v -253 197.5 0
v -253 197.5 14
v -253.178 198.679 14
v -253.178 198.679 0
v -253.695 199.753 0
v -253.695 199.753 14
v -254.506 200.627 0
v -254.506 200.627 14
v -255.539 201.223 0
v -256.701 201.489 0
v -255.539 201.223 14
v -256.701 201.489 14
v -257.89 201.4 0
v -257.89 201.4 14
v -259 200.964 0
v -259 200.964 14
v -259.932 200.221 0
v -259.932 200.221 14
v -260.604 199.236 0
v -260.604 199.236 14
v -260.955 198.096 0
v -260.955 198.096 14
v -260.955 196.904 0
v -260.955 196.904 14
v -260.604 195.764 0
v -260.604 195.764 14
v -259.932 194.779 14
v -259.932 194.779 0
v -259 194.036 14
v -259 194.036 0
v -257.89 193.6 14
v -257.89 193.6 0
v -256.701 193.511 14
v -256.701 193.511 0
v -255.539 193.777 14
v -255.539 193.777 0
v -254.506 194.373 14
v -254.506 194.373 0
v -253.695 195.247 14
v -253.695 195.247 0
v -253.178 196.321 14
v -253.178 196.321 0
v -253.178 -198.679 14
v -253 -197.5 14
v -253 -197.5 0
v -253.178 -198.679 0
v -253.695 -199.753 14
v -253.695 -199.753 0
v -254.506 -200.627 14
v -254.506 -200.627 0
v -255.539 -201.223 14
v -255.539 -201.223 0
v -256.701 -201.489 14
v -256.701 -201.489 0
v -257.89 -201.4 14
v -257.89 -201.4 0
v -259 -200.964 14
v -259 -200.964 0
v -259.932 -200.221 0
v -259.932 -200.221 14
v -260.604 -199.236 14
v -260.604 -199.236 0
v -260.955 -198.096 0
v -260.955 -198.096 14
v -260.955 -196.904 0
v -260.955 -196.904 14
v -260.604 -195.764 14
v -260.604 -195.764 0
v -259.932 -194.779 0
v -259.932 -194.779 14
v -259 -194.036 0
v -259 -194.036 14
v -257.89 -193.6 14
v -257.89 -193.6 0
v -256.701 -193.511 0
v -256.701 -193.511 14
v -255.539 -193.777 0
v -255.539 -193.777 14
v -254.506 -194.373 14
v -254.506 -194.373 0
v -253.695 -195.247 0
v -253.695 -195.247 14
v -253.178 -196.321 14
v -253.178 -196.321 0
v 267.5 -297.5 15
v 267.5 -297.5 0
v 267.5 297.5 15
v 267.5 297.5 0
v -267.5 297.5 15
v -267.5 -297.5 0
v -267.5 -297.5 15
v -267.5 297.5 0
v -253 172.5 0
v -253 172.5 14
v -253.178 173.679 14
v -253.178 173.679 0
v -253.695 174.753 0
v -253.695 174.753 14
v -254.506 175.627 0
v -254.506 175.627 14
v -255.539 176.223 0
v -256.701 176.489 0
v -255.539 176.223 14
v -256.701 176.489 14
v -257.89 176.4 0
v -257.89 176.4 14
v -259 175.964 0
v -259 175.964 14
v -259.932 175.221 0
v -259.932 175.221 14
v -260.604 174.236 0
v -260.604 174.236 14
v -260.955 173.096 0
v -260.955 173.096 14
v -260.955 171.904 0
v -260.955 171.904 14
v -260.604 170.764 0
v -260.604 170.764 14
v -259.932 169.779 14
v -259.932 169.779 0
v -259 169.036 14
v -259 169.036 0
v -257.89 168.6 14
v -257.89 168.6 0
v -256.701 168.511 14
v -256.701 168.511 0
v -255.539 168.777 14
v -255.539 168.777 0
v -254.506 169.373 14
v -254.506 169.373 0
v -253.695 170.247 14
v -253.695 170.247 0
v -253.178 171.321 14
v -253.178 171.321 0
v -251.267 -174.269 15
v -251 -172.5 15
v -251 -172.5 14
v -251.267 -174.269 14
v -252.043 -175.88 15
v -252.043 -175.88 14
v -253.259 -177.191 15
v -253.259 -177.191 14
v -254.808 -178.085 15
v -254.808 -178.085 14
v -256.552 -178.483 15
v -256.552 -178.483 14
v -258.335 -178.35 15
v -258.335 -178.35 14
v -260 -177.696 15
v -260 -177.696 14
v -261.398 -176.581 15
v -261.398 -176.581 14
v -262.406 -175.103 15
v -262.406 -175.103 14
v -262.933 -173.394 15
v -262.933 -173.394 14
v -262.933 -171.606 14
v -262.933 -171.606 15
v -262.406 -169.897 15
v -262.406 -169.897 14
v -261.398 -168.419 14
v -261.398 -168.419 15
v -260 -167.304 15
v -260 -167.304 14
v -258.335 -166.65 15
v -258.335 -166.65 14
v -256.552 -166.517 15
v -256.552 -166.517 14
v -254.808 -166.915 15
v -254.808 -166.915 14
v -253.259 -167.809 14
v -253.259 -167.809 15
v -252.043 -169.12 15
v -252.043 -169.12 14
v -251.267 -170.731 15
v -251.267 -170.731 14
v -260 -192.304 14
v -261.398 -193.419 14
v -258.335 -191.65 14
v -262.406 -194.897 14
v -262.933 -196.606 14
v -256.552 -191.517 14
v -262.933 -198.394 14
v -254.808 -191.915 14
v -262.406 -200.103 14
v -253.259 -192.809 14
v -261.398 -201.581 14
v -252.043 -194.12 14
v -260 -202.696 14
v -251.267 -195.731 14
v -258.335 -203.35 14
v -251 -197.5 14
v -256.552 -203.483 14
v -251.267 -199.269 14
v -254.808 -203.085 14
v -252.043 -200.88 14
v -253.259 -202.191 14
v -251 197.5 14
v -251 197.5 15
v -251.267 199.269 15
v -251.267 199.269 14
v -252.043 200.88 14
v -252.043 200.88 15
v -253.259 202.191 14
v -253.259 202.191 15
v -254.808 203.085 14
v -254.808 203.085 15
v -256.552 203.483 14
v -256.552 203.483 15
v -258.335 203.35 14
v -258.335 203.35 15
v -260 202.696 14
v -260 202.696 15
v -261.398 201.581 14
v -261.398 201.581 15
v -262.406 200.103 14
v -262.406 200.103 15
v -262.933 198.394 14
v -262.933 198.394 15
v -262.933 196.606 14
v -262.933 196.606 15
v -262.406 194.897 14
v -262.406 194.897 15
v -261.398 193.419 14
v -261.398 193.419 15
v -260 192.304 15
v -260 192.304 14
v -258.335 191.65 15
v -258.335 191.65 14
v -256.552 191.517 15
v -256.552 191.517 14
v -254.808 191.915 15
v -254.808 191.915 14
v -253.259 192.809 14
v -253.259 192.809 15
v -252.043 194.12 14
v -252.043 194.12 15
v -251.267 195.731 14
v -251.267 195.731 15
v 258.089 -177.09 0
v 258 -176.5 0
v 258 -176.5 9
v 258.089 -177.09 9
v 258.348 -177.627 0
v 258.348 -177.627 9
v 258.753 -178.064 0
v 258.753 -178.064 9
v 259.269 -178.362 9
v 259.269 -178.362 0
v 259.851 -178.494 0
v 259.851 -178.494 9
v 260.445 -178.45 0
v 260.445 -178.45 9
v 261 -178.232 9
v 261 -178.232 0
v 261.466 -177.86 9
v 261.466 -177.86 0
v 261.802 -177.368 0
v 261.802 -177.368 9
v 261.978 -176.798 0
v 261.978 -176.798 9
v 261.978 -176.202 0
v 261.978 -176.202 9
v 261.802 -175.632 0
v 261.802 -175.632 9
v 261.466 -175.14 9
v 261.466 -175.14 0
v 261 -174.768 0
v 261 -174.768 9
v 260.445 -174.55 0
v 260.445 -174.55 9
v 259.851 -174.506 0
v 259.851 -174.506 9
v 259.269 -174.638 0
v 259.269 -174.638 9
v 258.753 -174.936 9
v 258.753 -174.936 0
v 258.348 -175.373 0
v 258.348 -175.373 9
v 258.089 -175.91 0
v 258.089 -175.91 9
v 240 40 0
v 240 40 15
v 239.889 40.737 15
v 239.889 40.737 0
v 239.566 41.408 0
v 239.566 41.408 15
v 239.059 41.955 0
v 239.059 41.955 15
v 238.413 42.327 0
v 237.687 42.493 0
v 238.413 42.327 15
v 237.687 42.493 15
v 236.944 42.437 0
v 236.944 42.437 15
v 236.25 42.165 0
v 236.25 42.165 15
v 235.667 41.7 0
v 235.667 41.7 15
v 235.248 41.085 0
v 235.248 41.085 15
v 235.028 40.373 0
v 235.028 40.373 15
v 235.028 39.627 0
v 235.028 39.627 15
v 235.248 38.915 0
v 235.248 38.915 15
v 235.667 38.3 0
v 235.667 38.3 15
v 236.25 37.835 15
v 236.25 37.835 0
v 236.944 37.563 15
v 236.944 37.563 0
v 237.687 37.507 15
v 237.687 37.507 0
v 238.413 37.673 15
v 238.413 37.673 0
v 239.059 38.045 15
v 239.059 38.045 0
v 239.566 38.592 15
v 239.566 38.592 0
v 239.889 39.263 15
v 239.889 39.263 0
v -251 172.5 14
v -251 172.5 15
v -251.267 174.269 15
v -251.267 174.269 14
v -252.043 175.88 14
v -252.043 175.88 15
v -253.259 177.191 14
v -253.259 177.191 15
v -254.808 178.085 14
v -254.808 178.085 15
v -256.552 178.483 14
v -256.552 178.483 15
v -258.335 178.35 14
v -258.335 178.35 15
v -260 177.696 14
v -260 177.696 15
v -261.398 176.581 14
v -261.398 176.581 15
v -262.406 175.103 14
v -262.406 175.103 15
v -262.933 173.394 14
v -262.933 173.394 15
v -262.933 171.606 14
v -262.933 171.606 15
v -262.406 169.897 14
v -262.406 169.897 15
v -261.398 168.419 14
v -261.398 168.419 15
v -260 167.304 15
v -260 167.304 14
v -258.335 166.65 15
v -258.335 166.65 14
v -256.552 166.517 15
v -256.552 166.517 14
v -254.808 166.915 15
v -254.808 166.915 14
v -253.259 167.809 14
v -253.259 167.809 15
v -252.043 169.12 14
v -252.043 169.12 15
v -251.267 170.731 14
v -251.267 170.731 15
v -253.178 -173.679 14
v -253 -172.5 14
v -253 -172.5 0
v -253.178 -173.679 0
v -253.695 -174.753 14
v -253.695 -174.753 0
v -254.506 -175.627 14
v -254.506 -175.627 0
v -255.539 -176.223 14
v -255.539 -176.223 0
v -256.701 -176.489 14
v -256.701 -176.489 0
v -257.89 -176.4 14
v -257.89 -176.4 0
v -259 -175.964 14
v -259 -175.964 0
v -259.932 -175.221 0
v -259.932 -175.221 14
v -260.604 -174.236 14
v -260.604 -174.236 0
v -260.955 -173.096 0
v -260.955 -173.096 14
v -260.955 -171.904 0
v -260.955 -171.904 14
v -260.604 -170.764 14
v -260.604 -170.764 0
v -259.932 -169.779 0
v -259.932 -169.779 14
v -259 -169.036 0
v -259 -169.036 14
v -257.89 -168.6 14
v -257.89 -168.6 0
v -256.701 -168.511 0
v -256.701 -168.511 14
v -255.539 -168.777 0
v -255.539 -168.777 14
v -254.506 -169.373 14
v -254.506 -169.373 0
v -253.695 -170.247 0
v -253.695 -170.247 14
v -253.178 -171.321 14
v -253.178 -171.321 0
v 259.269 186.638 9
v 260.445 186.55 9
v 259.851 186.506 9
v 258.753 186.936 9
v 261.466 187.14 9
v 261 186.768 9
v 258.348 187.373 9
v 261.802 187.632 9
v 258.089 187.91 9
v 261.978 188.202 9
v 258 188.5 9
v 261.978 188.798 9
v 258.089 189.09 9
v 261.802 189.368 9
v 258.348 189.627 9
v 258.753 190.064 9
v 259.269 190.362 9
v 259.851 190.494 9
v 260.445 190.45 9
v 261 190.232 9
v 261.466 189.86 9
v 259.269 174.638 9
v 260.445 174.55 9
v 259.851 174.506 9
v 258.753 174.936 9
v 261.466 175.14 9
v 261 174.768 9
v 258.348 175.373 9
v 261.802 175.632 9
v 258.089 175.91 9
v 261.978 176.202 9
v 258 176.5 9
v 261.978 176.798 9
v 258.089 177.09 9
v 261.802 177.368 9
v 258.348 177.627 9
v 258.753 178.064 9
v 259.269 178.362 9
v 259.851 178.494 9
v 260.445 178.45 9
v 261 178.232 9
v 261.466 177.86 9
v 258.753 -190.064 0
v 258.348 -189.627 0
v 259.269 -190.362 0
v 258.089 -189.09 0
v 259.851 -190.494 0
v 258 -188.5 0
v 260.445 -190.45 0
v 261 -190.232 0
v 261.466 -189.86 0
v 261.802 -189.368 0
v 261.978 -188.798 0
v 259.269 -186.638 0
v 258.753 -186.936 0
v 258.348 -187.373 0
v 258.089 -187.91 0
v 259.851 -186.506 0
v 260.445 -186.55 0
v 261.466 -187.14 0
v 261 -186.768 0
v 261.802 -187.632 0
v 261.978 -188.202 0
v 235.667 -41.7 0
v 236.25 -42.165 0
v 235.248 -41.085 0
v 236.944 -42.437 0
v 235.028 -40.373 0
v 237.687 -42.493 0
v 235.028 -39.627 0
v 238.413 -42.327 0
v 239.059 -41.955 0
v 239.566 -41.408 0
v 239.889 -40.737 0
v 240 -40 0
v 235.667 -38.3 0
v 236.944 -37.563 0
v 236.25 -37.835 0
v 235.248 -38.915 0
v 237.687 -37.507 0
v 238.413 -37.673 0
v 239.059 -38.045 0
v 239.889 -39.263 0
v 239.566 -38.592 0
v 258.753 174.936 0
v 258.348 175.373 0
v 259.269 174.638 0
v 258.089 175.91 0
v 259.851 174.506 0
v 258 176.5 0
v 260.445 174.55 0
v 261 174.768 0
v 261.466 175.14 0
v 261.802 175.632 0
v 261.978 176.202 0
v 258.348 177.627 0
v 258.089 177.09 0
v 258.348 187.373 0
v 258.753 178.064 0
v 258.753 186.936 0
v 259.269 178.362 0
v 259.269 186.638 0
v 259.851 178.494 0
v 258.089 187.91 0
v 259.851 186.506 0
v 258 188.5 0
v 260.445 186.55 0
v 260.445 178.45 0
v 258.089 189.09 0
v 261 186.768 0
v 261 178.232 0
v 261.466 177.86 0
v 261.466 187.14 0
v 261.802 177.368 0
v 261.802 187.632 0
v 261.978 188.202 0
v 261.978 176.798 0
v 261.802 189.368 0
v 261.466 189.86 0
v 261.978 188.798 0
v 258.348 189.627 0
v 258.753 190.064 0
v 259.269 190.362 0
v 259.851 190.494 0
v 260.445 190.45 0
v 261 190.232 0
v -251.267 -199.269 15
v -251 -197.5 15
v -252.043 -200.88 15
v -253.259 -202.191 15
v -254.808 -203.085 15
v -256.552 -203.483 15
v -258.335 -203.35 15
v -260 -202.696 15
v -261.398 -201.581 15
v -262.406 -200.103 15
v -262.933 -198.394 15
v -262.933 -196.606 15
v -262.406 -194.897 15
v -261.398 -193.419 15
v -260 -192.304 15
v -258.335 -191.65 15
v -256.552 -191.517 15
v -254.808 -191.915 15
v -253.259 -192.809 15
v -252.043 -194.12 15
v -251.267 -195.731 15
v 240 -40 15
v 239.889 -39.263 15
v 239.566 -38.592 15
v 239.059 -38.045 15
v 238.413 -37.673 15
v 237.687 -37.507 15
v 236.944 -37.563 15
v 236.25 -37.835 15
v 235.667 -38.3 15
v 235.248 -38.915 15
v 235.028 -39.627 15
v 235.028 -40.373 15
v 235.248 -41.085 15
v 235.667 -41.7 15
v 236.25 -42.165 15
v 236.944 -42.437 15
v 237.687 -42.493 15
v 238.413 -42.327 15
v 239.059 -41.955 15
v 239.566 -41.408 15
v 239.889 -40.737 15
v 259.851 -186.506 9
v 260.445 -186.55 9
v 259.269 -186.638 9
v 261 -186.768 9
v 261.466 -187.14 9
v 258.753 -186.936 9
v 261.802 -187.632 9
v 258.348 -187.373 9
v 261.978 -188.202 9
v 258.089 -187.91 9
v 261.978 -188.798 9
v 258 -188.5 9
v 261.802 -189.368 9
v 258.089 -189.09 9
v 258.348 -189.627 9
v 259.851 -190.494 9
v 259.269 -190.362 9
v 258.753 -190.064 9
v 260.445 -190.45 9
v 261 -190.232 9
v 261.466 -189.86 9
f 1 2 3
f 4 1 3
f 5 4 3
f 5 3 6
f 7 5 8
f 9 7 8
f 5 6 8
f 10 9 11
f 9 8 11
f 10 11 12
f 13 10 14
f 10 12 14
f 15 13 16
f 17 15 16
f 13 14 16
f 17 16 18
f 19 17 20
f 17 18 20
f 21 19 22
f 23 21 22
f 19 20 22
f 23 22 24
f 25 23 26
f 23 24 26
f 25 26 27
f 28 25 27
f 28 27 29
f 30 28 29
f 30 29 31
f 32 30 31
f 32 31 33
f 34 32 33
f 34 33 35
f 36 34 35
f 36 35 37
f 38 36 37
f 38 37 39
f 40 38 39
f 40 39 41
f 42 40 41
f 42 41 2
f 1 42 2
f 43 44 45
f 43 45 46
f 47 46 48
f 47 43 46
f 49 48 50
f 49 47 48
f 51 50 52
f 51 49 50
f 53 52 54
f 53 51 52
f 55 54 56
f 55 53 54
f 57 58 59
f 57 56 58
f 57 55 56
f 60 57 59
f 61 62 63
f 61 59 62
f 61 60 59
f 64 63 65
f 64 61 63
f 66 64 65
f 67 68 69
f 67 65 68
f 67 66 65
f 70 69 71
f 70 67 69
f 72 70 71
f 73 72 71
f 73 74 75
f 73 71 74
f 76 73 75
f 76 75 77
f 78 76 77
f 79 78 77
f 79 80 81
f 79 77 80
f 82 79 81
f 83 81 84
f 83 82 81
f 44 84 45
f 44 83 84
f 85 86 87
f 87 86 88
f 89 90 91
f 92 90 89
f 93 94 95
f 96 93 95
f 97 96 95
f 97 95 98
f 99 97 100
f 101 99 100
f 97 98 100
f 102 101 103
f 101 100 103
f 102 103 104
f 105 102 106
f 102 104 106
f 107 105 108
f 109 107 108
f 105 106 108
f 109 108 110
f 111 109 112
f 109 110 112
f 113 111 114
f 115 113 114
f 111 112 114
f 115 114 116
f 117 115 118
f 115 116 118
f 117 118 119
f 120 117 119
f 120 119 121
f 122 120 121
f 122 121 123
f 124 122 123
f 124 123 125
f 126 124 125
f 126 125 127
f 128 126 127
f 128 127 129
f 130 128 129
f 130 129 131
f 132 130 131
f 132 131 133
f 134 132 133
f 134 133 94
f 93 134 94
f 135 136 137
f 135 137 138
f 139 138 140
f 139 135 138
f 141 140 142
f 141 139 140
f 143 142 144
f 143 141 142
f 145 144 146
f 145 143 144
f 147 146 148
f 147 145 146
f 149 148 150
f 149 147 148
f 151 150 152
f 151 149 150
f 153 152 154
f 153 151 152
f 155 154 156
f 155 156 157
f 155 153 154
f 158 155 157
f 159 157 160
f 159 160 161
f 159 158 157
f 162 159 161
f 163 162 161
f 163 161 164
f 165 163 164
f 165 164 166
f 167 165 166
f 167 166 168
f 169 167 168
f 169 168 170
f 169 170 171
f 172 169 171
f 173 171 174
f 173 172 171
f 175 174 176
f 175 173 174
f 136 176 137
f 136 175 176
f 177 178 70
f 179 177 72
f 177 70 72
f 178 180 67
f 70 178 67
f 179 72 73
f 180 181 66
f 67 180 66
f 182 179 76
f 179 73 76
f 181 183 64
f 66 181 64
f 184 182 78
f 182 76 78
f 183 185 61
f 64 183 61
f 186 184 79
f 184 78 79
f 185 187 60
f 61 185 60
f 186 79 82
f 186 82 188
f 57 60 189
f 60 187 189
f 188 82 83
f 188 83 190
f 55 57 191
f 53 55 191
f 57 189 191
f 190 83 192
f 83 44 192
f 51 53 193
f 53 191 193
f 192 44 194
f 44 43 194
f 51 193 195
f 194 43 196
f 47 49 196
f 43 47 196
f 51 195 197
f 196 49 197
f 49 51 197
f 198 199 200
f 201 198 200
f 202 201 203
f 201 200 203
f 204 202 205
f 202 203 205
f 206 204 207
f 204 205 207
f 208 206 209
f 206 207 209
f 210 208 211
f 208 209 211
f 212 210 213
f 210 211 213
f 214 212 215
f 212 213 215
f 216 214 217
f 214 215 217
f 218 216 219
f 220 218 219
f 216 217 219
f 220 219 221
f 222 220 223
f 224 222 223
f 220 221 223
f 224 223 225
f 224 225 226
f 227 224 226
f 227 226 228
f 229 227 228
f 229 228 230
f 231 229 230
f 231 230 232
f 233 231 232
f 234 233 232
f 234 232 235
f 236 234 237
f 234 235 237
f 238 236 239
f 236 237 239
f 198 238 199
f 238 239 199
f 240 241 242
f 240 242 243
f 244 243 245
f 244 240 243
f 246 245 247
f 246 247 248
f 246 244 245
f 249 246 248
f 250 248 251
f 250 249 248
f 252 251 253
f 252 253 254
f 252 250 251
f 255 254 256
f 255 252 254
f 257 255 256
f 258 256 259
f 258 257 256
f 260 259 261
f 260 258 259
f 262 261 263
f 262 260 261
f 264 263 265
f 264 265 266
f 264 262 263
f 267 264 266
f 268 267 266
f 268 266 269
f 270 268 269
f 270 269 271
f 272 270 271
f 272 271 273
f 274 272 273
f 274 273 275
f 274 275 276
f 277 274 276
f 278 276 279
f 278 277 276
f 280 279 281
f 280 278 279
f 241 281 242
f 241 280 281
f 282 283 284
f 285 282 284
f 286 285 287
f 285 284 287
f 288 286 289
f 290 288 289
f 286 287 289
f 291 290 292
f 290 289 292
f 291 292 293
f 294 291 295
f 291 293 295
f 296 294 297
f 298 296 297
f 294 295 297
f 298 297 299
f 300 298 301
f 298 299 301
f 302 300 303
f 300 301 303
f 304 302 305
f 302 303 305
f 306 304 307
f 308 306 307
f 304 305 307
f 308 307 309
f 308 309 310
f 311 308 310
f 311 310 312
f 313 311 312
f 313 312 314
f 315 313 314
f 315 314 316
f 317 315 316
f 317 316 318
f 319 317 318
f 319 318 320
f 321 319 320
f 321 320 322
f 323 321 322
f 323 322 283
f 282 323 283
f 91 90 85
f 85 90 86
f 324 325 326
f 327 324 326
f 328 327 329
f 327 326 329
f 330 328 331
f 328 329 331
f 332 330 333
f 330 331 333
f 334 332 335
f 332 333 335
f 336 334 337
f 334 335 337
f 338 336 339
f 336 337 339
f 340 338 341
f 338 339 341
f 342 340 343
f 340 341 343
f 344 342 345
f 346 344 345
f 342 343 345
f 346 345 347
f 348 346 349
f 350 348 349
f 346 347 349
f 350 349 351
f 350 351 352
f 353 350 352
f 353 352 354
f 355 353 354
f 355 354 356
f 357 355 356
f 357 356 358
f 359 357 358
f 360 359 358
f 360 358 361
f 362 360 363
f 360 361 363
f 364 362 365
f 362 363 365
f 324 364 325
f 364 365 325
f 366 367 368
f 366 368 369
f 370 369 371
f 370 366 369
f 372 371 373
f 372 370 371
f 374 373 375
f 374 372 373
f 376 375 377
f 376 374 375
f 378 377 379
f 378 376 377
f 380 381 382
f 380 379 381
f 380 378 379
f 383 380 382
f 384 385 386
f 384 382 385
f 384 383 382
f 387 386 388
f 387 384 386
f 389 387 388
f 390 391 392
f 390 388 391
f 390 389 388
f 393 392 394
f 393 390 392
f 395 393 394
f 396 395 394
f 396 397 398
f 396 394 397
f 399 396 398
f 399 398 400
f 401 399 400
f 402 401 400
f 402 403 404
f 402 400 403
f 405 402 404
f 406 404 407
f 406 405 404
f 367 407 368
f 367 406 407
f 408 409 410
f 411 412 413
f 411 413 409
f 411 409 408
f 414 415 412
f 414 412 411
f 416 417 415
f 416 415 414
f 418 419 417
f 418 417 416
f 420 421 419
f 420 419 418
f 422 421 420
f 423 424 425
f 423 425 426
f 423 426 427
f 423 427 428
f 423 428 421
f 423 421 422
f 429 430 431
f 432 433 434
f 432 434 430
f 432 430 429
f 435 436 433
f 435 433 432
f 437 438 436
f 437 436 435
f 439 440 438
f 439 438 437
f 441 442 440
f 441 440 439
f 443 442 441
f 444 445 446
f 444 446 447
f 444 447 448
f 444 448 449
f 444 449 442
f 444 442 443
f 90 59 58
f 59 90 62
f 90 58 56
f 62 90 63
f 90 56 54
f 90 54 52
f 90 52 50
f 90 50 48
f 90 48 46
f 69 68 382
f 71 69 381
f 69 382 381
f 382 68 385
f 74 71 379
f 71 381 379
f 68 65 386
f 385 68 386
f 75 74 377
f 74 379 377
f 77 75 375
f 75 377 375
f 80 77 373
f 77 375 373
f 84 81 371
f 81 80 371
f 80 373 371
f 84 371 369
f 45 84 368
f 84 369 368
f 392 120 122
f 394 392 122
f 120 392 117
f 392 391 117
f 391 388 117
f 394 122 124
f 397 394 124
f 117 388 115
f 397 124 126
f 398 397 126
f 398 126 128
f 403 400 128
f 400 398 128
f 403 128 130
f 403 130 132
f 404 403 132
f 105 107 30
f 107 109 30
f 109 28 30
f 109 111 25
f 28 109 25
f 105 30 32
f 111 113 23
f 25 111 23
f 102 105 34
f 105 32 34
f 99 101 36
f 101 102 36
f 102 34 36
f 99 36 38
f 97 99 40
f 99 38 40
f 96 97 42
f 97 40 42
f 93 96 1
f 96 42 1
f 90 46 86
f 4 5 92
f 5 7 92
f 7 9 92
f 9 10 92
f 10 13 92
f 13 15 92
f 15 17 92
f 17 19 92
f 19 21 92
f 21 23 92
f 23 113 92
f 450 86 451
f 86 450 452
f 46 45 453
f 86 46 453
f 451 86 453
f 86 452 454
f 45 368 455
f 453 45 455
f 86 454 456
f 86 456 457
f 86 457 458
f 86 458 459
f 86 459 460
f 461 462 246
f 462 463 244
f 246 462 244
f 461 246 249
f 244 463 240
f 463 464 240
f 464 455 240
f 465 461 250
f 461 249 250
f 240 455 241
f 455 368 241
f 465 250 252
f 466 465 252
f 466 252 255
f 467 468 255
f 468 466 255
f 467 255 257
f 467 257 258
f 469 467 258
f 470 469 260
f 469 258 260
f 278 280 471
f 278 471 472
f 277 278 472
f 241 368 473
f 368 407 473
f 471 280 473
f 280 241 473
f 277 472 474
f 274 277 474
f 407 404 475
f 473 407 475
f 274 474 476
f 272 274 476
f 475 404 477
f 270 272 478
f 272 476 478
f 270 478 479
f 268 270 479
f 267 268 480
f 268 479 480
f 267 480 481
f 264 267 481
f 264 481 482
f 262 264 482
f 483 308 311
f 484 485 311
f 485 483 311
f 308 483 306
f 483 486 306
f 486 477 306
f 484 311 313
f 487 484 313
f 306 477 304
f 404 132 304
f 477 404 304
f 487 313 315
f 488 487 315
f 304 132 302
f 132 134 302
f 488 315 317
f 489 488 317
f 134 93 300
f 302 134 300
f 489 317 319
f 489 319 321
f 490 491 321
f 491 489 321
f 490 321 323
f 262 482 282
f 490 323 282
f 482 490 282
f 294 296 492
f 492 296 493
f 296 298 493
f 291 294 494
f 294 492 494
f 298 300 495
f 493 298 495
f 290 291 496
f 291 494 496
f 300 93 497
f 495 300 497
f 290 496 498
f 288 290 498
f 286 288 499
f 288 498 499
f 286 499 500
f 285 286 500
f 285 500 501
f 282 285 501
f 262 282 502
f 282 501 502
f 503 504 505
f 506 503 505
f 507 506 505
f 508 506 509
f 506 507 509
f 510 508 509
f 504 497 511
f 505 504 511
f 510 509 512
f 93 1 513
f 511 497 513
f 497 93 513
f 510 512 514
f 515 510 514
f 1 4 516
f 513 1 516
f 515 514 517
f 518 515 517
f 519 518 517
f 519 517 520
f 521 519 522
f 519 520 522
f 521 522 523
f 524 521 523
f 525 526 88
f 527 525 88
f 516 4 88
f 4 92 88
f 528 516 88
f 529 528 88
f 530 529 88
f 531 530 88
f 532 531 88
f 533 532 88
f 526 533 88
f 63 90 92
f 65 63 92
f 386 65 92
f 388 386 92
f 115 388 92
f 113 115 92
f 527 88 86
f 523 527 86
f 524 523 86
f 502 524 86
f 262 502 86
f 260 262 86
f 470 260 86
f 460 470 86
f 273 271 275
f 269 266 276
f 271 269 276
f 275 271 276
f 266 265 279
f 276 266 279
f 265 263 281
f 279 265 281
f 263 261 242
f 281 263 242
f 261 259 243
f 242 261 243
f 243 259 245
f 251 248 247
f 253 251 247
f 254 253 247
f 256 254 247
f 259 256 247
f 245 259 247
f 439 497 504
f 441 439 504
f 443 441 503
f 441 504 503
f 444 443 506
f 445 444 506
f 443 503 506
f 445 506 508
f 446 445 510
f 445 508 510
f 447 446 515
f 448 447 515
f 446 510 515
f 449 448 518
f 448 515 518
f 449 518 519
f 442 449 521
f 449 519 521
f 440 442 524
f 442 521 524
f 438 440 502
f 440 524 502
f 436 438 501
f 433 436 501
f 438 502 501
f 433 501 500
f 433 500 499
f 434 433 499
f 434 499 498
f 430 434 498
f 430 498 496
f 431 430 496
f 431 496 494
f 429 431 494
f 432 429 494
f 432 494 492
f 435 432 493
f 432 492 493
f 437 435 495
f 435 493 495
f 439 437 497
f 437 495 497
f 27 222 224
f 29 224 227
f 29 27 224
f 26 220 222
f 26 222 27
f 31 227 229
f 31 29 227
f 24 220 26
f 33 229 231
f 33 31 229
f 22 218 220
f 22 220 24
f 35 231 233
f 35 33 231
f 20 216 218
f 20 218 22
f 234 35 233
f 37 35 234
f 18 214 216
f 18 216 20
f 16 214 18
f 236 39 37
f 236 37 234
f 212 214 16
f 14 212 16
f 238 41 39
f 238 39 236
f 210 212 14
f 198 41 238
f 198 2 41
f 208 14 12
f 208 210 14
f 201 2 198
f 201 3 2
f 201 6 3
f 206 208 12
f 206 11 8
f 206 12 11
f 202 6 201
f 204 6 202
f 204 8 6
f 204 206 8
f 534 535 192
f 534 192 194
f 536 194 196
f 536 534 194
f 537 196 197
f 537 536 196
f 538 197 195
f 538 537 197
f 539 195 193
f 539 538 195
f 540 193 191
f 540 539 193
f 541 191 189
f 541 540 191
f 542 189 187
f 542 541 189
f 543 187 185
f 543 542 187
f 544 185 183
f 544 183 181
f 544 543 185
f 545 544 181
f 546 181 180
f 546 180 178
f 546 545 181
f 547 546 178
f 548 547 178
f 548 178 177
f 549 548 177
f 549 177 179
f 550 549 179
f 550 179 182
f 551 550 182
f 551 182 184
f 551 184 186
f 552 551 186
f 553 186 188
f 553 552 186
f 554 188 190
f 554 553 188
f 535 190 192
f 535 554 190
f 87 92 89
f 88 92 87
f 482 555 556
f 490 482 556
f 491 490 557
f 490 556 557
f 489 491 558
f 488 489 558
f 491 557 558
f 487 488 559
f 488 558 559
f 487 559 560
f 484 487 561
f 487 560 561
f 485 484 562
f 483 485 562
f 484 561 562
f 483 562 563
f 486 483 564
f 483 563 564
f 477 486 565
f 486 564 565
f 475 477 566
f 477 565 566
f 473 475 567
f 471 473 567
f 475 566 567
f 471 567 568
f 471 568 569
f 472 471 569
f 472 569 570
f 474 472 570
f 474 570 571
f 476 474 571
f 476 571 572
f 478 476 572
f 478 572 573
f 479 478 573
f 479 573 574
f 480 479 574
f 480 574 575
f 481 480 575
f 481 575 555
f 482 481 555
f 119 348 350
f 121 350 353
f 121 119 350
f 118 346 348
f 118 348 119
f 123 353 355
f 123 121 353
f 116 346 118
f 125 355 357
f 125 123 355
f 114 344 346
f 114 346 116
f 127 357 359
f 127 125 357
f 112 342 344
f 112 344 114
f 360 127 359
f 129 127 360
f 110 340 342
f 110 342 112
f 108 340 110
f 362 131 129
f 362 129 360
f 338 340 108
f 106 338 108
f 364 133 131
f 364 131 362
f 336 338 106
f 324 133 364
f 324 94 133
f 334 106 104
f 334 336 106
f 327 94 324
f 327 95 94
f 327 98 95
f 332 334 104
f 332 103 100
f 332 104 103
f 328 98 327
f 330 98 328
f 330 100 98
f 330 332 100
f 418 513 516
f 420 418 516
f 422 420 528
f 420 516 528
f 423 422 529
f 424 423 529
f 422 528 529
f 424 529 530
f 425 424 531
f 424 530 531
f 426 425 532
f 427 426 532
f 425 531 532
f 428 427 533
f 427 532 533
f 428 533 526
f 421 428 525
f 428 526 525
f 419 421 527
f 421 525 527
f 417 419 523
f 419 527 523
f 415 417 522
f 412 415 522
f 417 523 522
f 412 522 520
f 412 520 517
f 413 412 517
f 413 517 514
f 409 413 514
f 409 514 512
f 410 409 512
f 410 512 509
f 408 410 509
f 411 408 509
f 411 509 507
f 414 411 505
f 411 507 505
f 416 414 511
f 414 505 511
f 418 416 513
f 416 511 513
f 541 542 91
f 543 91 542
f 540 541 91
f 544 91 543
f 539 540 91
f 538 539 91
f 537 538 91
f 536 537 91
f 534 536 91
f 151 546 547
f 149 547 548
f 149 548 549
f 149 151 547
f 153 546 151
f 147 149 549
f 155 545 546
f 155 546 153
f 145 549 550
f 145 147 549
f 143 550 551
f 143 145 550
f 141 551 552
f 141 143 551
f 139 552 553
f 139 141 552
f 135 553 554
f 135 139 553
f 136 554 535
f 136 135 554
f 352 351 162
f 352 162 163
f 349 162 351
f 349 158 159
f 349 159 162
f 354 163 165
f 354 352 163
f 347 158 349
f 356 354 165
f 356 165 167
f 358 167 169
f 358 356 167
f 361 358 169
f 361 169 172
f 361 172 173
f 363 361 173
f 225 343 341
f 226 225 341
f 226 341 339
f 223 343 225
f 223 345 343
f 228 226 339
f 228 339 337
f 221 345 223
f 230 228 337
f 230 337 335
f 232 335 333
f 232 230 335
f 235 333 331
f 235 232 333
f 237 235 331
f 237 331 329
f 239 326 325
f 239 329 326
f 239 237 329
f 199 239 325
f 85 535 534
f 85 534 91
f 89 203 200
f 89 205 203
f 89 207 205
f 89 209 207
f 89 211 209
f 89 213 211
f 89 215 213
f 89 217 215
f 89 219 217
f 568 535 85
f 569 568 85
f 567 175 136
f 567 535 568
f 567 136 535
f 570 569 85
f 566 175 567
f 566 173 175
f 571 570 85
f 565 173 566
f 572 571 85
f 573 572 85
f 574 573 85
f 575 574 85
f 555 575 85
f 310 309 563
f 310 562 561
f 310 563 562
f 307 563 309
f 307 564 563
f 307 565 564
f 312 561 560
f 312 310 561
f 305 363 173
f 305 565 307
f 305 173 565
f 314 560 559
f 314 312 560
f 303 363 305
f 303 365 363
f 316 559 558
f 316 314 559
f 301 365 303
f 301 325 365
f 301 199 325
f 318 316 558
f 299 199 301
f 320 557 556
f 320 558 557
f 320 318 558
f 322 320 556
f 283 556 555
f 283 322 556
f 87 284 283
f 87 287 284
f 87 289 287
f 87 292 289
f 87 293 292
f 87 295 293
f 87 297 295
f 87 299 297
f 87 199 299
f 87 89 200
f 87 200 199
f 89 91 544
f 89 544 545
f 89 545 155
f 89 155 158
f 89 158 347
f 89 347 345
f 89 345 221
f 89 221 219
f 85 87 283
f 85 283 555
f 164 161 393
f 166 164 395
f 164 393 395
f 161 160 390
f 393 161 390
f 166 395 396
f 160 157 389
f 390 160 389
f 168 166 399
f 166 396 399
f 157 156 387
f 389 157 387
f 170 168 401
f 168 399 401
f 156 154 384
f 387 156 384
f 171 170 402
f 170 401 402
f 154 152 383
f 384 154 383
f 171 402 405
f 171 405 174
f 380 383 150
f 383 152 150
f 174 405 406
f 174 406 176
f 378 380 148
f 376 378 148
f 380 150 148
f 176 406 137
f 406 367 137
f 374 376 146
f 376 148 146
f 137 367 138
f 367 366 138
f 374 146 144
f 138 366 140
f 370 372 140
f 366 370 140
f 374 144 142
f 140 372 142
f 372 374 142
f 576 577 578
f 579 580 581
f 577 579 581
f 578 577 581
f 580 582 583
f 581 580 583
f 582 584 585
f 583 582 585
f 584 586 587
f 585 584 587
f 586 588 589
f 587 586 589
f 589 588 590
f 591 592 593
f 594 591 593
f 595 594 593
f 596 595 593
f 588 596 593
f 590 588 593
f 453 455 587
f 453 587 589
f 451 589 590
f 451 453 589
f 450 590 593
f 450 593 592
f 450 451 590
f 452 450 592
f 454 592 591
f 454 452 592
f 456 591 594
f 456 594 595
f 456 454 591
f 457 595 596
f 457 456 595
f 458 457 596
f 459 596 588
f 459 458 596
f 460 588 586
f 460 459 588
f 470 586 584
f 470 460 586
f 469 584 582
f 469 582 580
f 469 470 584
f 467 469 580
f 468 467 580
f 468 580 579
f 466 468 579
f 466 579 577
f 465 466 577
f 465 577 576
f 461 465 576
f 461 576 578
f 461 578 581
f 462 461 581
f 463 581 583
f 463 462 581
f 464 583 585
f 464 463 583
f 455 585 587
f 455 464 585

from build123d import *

# Parameters (mm, degrees)
SKETCH_1_W          = 535
SKETCH_1_H          = 595
EXTRUDE_1_DEPTH     = 15
SKETCH_2_R          = 4
CUT_EXTRUDE_2_DEPTH = 16
SKETCH_3_R          = 6
CUT_EXTRUDE_4_DEPTH = 1
SKETCH_4_R          = 2.5
CUT_EXTRUDE_5_DEPTH = 16
SKETCH_5_R          = 2
CUT_EXTRUDE_6_DEPTH = 9


with BuildPart() as part:
    # Sketch 1 → Extrude 1 (new body)
    with BuildSketch(Plane.XY):
        Rectangle(SKETCH_1_W, SKETCH_1_H)
    extrude(amount=EXTRUDE_1_DEPTH)

    # Sketch 2 → Cut-Extrude 2 (cut, through all)
    with BuildSketch(Plane.XY.offset(15)):
        with Locations((-257, 197.5)):
            Circle(SKETCH_2_R)
        with Locations((-257, 172.5)):
            Circle(SKETCH_2_R)
    cut_extrude_2 = extrude(amount=-CUT_EXTRUDE_2_DEPTH, mode=Mode.SUBTRACT)

    # Mirror 2: Cut-Extrude 2 across plane
    add(cut_extrude_2.mirror(Plane.ZX), mode=Mode.SUBTRACT)

    # Sketch 3 → Cut-Extrude 4 (cut)
    with BuildSketch(Plane.XY.offset(15)):
        with Locations((-257, 197.5)):
            Circle(SKETCH_3_R)
        with Locations((-257, 172.5)):
            Circle(SKETCH_3_R)
    cut_extrude_4 = extrude(amount=-CUT_EXTRUDE_4_DEPTH, mode=Mode.SUBTRACT)

    # Mirror 4: Cut-Extrude 4 across plane
    add(cut_extrude_4.mirror(Plane.ZX), mode=Mode.SUBTRACT)

    # Sketch 4 → Cut-Extrude 5 (cut, through all)
    with BuildSketch(Plane.XY.offset(15)):
        with Locations((237.5, 40)):
            Circle(SKETCH_4_R)
        with Locations((237.5, -40)):
            Circle(SKETCH_4_R)
    extrude(amount=-CUT_EXTRUDE_5_DEPTH, mode=Mode.SUBTRACT)

    # Sketch 5 → Cut-Extrude 6 (cut)
    with BuildSketch(Plane(origin=(0, 0, 0), x_dir=(-1, 0, 0), z_dir=(0, 0, -1))):
        with Locations((-260, 188.5)):
            Circle(SKETCH_5_R)
        with Locations((-260, 176.5)):
            Circle(SKETCH_5_R)
    cut_extrude_6 = extrude(amount=-CUT_EXTRUDE_6_DEPTH, mode=Mode.SUBTRACT)

    # Mirror 5: Cut-Extrude 6 across plane
    add(cut_extrude_6.mirror(Plane.ZX), mode=Mode.SUBTRACT)


solid = part.part
